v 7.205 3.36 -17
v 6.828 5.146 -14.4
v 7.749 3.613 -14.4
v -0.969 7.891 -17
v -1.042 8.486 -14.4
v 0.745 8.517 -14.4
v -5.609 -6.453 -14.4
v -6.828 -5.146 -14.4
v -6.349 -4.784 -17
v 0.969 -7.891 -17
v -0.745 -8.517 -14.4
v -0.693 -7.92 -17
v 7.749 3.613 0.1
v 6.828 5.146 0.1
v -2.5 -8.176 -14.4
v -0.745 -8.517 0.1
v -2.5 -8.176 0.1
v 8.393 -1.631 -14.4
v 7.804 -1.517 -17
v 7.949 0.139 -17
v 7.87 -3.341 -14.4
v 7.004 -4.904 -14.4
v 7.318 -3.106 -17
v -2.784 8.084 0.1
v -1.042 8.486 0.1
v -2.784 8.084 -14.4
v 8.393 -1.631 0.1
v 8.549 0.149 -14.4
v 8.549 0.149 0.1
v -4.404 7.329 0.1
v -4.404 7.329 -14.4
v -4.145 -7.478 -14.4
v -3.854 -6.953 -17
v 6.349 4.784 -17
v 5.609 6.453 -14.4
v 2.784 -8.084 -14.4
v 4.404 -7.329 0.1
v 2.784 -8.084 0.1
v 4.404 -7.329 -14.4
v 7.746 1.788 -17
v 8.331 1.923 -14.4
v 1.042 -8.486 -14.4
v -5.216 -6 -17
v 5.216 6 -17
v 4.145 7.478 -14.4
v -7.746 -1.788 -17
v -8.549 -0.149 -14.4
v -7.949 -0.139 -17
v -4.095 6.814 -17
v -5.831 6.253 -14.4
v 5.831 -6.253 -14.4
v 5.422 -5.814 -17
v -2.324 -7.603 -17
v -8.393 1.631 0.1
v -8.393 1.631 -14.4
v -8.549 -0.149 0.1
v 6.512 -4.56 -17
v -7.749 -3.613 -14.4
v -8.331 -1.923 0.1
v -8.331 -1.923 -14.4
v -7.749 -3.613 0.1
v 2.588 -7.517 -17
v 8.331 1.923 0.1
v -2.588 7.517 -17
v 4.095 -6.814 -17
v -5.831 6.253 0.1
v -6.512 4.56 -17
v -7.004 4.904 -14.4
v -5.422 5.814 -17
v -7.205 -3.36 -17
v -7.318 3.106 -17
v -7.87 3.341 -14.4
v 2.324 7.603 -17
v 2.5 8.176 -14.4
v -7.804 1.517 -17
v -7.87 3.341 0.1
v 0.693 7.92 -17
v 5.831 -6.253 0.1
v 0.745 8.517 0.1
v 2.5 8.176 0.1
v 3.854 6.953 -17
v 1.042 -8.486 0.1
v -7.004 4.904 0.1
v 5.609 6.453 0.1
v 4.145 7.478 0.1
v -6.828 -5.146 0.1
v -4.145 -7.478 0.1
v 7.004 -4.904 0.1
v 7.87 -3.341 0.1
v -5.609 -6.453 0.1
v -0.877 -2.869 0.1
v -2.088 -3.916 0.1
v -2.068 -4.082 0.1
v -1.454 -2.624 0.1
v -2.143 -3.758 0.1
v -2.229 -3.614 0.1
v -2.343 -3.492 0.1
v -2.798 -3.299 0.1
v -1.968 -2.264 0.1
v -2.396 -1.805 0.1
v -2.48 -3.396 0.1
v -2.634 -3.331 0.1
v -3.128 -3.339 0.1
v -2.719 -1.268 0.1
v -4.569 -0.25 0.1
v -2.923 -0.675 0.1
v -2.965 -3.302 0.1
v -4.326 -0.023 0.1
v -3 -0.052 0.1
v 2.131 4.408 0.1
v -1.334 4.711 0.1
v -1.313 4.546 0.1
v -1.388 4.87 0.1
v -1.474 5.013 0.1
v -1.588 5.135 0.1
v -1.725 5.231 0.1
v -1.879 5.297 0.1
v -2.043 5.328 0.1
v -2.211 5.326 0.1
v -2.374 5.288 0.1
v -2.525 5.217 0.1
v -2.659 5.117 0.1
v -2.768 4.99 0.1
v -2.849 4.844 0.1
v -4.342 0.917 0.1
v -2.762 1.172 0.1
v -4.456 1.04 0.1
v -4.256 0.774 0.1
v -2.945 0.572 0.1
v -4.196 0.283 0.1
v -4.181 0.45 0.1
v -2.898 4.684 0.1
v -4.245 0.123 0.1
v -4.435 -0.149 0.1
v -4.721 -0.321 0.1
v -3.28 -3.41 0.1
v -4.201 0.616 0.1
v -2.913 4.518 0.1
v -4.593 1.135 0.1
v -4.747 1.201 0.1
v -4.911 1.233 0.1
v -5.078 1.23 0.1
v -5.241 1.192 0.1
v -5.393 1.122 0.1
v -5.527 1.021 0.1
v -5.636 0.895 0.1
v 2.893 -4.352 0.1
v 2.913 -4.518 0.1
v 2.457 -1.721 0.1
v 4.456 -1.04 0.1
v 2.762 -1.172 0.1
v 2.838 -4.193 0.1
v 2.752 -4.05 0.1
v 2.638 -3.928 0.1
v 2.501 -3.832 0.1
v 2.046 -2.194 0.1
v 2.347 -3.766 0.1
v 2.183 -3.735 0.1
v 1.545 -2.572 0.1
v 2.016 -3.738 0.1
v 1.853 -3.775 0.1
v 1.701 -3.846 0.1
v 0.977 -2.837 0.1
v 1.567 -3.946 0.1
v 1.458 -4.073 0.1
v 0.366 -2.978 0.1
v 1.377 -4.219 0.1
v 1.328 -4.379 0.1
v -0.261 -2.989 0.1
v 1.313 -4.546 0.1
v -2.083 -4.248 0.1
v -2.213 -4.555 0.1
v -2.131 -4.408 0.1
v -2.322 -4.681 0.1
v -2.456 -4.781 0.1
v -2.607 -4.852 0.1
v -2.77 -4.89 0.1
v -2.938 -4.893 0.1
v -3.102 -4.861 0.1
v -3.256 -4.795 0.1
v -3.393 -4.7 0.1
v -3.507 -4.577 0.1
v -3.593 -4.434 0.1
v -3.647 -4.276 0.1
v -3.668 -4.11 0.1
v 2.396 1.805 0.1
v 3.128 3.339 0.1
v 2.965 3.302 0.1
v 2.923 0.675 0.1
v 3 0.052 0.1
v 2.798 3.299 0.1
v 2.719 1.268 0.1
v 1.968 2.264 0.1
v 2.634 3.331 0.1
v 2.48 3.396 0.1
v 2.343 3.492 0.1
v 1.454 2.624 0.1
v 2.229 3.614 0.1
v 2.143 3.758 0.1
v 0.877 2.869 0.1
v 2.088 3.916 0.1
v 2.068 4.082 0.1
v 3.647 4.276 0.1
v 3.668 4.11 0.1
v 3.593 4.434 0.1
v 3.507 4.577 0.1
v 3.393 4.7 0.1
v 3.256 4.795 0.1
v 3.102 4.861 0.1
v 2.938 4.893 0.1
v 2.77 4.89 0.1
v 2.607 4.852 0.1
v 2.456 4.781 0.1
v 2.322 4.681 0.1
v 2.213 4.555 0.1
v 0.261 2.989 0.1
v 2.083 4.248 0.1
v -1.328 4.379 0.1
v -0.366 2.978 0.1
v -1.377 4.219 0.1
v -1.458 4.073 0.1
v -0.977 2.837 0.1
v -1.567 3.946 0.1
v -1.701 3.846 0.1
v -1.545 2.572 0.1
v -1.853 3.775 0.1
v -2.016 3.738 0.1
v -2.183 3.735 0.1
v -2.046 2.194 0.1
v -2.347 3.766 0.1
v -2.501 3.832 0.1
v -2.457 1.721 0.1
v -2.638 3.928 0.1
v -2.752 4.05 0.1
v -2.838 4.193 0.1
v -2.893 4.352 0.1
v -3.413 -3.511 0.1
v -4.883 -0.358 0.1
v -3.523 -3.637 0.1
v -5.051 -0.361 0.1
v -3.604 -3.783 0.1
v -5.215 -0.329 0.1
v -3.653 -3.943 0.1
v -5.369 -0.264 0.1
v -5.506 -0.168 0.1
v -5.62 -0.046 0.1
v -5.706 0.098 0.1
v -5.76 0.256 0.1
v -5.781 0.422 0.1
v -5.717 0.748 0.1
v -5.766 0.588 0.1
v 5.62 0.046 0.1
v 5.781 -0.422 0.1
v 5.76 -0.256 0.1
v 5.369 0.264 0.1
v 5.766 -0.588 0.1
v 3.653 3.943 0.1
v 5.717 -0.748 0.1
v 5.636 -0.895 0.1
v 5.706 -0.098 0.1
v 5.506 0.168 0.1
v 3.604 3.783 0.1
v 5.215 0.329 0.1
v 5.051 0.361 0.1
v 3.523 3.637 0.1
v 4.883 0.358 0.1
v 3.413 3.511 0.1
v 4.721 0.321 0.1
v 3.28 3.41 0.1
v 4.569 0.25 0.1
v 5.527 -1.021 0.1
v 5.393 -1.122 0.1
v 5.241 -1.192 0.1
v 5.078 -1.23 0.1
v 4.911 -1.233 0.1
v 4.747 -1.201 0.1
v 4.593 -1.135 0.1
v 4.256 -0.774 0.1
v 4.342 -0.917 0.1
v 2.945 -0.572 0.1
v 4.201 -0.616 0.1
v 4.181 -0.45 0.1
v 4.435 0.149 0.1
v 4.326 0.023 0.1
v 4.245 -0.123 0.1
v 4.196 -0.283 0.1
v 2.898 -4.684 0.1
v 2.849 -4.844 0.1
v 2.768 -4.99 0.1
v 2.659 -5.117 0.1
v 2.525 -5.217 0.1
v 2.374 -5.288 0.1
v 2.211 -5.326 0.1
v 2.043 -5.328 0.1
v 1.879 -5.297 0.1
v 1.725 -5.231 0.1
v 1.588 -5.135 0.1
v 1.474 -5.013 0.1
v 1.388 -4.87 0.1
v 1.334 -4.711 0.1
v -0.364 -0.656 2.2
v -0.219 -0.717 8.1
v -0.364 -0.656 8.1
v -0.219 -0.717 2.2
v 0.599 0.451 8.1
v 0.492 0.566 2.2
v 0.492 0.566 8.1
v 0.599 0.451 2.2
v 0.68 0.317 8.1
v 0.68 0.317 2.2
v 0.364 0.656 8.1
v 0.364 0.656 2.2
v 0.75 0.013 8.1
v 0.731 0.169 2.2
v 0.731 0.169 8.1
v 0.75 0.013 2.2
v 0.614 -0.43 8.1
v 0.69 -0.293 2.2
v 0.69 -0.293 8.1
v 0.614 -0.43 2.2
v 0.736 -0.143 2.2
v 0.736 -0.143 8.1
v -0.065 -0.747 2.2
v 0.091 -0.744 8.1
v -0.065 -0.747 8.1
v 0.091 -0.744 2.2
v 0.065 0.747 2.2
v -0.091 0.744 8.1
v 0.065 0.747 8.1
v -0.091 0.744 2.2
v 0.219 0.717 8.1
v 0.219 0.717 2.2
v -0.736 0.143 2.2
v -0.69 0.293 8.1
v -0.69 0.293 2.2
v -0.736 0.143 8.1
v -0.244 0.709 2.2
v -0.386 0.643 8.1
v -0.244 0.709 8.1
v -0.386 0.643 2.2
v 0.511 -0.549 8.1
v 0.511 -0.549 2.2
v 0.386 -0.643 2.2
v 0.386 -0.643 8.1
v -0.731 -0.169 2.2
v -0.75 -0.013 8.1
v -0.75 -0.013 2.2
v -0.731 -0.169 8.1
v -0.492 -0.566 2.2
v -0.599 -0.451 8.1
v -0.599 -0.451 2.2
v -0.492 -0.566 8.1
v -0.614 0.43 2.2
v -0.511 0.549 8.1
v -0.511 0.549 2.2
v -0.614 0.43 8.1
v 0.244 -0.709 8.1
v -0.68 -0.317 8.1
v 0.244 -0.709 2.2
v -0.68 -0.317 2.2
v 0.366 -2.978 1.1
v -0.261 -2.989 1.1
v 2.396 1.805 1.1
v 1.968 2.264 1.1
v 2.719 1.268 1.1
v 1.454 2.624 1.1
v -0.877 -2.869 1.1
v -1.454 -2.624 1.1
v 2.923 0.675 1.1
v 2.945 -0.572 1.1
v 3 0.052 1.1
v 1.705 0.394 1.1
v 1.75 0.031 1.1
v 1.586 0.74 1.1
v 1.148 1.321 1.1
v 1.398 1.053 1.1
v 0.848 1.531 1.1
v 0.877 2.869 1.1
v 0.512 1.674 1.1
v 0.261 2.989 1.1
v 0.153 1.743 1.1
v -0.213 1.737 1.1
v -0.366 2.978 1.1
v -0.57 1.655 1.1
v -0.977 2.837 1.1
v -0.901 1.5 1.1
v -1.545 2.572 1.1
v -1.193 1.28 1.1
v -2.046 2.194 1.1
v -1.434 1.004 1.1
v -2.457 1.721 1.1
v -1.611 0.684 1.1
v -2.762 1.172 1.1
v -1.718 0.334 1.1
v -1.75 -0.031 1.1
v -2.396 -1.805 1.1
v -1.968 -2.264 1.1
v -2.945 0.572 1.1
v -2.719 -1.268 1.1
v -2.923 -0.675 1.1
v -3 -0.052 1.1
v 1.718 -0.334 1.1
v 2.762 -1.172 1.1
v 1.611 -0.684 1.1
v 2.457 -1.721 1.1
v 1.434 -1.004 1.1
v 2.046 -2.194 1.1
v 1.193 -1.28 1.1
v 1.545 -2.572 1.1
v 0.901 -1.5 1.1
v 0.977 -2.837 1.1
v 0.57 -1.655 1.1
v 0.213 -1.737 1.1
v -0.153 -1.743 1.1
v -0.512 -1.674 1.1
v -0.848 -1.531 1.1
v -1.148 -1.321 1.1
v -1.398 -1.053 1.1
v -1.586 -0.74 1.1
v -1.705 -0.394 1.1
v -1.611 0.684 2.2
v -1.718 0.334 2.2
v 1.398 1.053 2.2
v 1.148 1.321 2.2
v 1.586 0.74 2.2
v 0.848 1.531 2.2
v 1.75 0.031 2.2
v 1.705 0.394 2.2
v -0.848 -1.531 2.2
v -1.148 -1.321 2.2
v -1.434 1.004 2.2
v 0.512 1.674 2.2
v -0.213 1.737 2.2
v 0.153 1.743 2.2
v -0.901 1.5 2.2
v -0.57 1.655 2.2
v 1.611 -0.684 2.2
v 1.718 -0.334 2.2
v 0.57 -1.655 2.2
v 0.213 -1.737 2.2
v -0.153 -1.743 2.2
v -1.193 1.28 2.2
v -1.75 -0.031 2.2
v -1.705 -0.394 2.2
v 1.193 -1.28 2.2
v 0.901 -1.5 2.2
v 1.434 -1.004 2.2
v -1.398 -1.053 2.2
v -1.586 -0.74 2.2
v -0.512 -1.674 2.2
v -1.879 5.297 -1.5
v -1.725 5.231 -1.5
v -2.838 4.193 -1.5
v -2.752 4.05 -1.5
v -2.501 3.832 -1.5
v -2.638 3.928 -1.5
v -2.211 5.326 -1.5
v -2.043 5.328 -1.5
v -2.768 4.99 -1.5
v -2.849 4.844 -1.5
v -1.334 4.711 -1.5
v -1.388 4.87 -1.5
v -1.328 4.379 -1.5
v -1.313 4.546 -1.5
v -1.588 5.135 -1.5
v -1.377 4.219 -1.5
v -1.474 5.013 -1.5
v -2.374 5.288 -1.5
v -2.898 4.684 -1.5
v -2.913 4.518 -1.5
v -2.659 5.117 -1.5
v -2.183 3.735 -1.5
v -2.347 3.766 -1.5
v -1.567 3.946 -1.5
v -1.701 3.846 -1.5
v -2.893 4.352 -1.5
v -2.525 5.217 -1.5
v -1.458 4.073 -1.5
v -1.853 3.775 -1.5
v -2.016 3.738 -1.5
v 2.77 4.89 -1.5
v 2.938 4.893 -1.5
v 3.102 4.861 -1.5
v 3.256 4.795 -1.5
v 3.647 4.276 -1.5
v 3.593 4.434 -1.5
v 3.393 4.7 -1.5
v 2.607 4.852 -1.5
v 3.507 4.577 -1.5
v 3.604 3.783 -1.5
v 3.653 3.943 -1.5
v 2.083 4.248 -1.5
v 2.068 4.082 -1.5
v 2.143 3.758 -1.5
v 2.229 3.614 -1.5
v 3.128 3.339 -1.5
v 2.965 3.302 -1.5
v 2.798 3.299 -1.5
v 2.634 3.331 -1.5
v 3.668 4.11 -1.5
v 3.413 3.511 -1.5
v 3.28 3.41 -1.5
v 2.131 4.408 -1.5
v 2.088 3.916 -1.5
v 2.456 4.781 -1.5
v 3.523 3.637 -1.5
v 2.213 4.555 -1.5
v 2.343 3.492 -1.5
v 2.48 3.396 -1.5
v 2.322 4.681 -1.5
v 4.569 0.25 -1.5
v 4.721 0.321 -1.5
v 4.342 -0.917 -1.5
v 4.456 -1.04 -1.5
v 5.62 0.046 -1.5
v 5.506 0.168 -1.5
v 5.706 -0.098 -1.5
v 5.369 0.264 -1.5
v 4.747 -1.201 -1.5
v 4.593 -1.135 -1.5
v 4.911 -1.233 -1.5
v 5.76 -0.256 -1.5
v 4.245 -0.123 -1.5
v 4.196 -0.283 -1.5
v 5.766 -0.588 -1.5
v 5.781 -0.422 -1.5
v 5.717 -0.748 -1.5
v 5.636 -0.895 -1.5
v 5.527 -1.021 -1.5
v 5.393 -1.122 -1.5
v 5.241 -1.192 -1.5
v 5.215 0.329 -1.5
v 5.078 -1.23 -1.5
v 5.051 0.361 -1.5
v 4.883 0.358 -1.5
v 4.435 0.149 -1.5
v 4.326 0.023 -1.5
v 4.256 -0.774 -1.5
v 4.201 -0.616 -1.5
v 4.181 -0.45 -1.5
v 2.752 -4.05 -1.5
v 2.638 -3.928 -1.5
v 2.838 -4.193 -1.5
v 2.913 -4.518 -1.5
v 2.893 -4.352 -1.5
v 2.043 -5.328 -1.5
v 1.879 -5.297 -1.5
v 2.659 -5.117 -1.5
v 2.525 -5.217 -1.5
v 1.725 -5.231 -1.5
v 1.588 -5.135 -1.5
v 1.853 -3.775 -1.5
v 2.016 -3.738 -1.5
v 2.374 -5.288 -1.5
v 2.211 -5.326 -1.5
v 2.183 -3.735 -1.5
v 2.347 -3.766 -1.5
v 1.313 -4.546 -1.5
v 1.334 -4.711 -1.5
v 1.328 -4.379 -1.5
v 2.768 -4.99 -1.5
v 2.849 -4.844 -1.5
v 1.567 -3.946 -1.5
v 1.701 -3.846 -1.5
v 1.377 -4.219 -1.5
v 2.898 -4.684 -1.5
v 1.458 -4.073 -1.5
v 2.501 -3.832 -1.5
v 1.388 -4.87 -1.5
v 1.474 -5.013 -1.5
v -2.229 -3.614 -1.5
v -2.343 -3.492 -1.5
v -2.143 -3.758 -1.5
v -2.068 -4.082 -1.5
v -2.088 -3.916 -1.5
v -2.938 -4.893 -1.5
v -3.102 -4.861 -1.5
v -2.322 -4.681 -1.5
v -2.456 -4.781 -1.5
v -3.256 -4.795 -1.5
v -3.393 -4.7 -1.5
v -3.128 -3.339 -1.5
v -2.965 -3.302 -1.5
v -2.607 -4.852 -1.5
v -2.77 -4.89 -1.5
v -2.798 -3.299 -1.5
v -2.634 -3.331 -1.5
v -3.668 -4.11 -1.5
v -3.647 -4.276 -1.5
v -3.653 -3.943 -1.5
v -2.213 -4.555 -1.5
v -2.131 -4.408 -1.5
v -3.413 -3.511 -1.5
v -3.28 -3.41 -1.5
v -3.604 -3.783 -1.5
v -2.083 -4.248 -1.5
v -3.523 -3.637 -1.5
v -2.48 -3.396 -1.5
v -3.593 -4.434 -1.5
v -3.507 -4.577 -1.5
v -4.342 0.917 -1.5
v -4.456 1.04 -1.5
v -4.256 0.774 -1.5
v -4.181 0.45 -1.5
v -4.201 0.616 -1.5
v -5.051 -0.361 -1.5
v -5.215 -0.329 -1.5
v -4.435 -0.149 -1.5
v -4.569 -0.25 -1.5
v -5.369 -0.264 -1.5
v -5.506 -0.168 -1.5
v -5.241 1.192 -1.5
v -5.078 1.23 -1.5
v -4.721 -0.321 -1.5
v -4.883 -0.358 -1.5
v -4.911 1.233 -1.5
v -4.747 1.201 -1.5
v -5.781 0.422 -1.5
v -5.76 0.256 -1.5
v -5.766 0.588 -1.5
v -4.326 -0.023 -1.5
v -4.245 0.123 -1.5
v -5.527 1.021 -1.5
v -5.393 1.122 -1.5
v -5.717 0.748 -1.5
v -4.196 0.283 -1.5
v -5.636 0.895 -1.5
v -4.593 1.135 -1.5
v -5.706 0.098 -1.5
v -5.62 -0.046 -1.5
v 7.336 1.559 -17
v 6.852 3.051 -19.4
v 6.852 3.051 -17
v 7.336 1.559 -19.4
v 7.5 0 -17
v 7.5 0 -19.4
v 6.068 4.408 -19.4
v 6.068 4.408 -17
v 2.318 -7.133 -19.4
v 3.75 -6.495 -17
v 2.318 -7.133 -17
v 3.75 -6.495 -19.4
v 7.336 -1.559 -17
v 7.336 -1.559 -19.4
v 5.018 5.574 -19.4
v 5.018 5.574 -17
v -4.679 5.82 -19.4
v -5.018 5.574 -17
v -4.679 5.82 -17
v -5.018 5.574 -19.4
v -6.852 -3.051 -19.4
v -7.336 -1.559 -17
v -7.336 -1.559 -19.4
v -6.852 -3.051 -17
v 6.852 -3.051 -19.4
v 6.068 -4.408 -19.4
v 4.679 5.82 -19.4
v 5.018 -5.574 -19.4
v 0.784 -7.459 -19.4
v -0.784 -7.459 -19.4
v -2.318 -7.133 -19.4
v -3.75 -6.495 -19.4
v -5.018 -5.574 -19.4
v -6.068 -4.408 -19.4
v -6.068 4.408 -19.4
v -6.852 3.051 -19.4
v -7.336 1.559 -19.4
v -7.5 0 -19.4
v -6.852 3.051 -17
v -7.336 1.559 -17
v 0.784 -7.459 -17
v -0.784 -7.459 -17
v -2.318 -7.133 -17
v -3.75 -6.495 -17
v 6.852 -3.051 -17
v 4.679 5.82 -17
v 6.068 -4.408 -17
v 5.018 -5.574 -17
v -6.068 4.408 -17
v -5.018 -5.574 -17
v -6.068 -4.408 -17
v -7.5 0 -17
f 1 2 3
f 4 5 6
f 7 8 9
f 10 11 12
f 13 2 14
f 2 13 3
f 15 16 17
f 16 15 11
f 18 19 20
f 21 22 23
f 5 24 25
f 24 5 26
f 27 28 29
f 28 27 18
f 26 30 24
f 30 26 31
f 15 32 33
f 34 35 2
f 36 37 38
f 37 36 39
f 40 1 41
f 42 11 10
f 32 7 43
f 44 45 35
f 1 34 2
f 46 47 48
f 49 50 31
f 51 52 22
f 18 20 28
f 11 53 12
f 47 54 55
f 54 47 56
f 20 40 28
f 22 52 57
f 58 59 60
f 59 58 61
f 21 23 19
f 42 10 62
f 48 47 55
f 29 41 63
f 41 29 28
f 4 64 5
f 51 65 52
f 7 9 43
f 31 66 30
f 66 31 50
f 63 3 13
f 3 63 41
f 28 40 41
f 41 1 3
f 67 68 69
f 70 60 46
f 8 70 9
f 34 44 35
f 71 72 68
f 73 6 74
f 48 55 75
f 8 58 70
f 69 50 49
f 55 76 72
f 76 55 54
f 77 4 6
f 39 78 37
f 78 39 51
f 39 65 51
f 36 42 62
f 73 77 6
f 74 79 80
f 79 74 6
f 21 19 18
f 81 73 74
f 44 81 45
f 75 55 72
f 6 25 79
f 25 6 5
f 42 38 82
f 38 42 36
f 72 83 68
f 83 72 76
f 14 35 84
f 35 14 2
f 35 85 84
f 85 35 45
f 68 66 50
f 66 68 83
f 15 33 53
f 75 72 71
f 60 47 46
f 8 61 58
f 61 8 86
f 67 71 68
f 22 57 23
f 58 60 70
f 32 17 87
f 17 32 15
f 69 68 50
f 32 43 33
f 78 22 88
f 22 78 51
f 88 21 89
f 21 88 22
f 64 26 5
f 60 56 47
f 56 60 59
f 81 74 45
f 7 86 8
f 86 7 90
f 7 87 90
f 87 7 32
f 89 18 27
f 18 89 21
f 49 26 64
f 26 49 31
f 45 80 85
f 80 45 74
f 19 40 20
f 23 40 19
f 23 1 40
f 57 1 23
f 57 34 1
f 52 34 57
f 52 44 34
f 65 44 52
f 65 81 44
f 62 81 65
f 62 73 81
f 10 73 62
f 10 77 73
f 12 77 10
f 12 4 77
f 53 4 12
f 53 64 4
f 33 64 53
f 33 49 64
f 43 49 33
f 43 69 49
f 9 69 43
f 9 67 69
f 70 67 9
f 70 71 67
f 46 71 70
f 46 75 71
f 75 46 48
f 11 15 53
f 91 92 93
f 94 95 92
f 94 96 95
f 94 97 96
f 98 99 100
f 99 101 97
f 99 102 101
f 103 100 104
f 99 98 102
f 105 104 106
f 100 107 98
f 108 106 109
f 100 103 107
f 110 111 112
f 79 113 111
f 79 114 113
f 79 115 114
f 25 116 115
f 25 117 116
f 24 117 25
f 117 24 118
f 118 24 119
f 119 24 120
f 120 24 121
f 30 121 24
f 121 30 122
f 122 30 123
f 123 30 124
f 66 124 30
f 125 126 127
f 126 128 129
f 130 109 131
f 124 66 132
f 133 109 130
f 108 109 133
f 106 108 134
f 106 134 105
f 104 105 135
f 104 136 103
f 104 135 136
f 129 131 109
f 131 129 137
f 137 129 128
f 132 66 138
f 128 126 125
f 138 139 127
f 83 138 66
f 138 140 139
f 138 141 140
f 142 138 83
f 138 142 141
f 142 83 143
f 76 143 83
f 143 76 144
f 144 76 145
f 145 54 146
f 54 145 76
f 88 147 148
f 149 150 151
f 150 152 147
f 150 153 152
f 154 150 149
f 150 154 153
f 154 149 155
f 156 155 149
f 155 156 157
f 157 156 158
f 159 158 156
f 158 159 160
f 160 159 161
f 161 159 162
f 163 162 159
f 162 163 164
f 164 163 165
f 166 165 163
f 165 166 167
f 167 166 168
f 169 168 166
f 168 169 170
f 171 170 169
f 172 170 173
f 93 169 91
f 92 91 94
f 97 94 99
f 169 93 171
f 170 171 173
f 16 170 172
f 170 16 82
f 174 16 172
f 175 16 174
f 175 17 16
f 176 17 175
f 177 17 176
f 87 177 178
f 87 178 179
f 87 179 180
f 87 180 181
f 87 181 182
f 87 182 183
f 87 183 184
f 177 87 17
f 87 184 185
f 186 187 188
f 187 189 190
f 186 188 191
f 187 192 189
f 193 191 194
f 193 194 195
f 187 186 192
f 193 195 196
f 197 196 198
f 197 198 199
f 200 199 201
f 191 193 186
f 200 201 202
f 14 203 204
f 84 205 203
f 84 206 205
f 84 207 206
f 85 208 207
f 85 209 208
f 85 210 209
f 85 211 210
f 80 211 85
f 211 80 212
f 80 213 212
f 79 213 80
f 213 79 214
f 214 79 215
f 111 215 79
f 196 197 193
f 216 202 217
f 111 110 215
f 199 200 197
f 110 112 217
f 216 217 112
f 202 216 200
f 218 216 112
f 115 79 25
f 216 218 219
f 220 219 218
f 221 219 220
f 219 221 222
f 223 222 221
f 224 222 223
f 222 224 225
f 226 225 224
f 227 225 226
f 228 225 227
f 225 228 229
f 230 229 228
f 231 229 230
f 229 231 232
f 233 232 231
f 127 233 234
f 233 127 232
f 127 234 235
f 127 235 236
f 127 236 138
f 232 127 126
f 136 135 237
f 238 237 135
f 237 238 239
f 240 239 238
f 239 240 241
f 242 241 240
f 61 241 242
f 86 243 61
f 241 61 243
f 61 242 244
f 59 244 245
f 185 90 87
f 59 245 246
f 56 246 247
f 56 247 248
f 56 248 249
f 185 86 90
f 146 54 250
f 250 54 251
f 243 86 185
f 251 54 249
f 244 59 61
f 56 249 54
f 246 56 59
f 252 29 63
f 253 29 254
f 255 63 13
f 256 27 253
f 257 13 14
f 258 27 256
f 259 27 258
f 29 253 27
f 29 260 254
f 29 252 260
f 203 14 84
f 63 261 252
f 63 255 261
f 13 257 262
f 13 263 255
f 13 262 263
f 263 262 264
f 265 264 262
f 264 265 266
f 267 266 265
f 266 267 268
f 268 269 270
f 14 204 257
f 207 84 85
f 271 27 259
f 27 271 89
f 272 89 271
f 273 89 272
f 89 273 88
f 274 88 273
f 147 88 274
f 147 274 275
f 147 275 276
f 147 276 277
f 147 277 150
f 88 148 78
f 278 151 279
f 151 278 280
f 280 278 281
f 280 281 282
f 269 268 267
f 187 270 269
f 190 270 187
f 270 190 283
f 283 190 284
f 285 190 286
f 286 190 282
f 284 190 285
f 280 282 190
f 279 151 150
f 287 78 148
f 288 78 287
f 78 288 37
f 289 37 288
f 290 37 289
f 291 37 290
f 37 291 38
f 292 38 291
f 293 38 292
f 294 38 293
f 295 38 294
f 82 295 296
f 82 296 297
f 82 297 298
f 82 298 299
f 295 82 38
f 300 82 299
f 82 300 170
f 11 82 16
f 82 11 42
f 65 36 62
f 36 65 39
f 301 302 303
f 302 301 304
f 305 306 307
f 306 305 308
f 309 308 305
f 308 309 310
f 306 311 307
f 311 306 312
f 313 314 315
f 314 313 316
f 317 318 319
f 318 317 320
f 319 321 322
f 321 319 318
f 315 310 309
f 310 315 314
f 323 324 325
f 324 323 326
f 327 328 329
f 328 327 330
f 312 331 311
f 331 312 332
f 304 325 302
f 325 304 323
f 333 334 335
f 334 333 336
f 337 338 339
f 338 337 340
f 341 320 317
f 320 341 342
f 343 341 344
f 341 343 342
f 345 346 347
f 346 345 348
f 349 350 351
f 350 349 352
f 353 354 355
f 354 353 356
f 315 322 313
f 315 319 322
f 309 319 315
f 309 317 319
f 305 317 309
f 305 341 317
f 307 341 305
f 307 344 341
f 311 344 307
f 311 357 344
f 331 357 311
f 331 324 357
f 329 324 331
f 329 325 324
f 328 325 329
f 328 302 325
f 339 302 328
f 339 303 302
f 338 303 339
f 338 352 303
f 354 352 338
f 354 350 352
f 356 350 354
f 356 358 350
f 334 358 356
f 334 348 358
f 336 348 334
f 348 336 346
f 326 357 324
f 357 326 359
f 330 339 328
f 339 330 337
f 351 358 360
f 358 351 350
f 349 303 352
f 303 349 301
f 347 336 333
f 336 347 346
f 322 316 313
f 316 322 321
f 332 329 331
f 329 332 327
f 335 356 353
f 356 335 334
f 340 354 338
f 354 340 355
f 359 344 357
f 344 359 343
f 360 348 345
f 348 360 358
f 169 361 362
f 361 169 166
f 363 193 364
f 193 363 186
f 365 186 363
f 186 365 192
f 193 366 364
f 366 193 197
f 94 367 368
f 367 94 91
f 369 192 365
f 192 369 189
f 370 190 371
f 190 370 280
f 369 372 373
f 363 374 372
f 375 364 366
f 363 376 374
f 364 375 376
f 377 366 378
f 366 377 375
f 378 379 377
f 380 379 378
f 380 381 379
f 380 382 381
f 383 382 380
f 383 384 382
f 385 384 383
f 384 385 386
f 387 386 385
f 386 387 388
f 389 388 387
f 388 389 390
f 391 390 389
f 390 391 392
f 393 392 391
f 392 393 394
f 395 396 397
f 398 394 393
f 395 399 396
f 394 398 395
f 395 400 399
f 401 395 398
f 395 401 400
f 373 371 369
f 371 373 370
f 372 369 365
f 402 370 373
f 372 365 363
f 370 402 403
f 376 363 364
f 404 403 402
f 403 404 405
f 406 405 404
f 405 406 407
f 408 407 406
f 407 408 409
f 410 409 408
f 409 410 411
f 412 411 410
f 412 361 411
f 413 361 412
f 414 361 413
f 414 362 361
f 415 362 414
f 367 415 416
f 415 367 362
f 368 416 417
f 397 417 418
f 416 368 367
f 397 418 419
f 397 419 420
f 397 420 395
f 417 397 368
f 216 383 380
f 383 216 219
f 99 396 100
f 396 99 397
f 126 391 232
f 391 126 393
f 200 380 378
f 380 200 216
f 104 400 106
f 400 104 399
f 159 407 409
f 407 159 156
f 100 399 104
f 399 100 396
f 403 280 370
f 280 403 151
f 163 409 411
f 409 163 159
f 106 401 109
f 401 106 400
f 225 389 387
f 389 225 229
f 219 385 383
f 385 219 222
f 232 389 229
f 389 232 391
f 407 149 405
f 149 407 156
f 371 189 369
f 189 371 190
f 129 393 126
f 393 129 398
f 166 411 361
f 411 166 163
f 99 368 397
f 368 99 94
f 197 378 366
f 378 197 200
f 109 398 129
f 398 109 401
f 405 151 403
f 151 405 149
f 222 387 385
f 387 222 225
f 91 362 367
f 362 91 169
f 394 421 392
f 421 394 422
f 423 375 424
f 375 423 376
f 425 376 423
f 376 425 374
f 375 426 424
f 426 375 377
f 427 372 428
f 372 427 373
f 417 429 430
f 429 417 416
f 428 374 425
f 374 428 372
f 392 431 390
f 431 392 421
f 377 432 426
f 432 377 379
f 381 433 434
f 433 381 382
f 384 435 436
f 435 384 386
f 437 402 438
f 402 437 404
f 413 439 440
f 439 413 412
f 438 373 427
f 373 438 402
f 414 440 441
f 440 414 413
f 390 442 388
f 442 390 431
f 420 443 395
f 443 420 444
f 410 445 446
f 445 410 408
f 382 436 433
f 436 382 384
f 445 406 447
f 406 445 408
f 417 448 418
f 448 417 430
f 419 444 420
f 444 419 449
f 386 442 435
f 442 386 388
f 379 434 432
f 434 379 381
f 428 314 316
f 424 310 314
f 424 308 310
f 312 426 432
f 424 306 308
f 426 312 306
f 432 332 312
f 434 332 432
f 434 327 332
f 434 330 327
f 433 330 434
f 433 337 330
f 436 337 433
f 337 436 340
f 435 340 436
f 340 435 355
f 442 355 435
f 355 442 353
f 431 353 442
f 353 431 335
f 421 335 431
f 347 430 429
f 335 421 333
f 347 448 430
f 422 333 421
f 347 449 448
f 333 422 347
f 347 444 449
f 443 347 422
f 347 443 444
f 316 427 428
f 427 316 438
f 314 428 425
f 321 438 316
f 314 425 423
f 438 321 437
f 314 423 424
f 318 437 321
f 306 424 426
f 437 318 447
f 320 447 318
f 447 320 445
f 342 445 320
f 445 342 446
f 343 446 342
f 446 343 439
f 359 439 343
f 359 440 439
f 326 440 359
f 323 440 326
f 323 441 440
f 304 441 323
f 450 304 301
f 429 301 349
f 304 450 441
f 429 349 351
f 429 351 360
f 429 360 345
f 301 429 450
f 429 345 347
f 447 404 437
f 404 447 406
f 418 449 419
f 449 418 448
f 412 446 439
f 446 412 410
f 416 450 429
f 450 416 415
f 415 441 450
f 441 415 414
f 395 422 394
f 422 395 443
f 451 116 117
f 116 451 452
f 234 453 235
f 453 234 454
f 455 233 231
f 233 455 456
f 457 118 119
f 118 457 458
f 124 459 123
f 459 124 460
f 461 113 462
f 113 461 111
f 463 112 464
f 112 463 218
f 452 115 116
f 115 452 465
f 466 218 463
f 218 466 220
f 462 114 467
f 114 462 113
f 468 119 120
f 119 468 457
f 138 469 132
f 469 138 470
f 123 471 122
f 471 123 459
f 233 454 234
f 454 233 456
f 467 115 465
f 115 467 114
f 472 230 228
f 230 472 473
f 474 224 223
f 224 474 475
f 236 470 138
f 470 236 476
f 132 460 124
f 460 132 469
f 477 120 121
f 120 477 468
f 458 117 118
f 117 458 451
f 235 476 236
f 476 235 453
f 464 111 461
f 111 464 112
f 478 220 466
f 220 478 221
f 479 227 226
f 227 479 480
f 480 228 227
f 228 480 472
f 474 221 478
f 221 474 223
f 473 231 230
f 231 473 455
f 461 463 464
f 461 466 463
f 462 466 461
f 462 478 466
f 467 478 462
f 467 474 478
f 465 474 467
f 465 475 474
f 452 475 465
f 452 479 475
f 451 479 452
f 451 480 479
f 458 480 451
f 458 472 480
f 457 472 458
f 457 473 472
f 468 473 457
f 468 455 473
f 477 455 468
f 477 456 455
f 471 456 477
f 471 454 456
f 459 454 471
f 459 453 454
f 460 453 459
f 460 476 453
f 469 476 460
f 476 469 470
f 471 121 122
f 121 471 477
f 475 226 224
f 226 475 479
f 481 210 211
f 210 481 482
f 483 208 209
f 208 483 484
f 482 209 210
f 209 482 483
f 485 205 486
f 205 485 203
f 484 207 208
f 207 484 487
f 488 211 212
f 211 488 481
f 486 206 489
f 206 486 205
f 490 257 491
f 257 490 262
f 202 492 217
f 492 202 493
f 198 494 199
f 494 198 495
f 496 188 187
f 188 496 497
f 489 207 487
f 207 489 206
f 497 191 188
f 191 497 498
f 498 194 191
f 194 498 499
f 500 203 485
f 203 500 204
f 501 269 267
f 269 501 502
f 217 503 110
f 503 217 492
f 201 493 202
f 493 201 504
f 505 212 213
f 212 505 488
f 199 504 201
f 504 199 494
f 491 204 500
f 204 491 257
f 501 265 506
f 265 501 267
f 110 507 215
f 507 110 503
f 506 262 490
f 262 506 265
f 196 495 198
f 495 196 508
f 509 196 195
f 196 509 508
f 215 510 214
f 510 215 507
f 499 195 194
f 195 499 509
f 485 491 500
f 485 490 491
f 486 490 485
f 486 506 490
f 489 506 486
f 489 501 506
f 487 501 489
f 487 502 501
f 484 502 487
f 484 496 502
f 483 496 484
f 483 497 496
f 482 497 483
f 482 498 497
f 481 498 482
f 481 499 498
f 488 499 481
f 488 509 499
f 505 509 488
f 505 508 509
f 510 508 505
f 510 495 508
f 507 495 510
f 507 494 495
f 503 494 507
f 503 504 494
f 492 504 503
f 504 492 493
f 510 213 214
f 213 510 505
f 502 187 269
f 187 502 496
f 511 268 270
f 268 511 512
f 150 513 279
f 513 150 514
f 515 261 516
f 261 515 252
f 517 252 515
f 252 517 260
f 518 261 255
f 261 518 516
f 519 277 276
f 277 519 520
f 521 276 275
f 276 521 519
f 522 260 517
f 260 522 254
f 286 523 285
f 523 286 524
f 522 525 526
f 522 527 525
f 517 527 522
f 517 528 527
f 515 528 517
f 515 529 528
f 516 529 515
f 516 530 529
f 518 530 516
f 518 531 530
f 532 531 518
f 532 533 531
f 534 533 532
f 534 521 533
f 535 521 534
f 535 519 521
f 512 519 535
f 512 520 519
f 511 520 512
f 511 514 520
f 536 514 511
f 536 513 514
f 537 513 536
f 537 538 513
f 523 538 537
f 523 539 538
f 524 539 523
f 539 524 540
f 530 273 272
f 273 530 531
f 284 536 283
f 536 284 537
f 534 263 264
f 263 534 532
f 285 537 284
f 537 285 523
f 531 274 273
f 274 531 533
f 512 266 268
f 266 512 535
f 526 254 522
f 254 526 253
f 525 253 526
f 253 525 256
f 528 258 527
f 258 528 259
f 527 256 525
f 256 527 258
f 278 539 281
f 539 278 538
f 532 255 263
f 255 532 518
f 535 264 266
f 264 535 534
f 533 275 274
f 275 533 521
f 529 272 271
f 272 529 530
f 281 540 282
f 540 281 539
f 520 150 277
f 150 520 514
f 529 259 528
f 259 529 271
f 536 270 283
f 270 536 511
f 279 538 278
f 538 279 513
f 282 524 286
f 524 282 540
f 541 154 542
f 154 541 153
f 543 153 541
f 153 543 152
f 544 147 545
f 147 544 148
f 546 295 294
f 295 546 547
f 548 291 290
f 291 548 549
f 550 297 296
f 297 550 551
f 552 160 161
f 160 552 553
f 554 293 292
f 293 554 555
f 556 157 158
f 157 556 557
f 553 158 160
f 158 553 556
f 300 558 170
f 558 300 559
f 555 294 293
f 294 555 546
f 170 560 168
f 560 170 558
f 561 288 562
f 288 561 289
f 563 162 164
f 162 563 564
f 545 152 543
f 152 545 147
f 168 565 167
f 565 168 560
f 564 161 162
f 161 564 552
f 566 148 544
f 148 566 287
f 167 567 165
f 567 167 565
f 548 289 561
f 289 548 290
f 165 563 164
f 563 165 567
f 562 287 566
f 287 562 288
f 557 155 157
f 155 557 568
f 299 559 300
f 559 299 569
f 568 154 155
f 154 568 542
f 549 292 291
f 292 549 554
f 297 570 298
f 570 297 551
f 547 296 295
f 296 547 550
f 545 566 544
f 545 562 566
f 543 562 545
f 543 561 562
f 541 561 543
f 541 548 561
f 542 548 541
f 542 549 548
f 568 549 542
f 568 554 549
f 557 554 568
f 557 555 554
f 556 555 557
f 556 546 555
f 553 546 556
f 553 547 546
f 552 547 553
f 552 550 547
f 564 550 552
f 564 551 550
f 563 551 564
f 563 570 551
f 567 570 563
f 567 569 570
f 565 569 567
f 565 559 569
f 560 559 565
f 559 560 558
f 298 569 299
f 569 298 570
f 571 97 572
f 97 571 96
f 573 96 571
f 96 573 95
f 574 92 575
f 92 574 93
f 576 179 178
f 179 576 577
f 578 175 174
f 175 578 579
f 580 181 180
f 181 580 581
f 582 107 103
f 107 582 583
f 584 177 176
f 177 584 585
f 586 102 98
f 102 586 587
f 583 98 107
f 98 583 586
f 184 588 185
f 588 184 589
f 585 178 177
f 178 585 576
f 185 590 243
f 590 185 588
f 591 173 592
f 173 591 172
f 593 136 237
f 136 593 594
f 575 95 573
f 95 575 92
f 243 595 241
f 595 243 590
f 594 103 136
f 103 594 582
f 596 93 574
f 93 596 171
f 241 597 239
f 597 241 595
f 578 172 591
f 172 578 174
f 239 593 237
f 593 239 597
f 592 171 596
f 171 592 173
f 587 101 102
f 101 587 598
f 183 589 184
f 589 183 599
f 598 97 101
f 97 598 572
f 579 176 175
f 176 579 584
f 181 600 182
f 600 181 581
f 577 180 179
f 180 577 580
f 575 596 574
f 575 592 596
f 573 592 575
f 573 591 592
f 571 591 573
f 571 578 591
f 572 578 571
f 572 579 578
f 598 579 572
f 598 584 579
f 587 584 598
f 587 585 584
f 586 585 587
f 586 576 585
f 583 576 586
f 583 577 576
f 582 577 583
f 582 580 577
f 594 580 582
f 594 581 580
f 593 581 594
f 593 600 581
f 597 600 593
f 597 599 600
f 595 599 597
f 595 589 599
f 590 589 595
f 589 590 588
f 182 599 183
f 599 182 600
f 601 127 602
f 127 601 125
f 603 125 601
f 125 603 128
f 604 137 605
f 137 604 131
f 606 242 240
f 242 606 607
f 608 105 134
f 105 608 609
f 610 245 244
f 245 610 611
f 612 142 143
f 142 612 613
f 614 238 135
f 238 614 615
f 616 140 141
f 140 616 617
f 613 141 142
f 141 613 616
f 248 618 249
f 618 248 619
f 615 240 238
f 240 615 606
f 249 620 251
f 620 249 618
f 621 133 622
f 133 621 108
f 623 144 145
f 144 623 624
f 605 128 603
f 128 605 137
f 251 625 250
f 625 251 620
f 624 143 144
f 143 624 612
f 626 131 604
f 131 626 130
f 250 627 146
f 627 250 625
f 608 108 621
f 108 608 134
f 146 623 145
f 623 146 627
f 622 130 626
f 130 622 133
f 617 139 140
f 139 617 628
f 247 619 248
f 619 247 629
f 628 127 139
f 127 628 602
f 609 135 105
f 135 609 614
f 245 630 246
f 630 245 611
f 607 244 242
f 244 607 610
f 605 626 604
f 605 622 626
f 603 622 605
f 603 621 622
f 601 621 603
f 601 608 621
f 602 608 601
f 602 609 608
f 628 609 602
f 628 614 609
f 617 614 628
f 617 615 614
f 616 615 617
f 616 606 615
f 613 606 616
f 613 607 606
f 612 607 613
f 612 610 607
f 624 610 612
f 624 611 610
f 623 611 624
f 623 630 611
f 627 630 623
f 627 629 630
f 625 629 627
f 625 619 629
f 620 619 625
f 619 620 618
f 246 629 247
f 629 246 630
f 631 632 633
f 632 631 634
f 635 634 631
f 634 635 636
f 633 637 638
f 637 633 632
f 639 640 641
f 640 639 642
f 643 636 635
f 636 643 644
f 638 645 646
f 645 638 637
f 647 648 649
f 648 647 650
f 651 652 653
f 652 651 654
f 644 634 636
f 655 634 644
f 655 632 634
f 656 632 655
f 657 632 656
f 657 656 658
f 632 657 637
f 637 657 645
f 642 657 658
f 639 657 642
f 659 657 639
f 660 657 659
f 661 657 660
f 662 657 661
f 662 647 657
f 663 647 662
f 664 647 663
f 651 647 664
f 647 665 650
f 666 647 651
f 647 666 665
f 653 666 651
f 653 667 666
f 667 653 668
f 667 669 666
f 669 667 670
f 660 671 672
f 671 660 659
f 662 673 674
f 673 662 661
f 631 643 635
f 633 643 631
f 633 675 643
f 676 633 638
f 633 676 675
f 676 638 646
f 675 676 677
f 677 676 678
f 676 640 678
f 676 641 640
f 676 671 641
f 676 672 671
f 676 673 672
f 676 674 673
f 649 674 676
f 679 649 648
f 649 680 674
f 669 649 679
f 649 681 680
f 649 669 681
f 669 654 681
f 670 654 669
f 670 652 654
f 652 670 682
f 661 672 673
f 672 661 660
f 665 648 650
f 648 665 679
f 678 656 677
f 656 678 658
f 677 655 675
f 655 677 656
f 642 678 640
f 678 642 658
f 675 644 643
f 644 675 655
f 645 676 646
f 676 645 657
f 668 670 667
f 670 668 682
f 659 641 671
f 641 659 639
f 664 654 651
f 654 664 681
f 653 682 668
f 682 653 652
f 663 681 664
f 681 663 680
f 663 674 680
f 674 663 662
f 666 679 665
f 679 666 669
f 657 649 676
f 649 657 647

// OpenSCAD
//motor 1717 modeling
//encoder
//https://www.shinkoh-faulhaber.jp/JP_data_edition_2020/JP_IEH2-4096_DFF.pdf
//https://www.shinkoh-faulhaber.jp/products/series/1717sr
//Author Y.Nakagawa
//Date: 2024/12/07
//revised: 2025/1/10

motor1717(25);
//motor1717(5);
//connector1717();
//encoder1717();
//motor1717_screwhole();


module motor1717(rotate){
  translate([0,0,-17])rotate([0,0,rotate])motor1717_body();
  translate([0,0,-17-2.4]) encoder1717();
}

module motor1717_body(){
  $fs = 0.01;
  mr1 = 17.1/2; //mm motor radius //モーター半径
  mr2 = 15.9/2; //mm motor 肩のスボミの径
  mh1 =14.5; //mm motor length //モーターのスボミまでの長さ
  mh2 =17.1-mh1; //mm motor length //モーターのスボミの長さ
  axr =1.5/2; //mm motor axis radius //モーター軸の半径
  axl = 8; //mm motor axis length //モーター軸の長さ
  axl2 = 6; //mm 使わないが、軸が出てる長さは6㎜
  cr1 = 6/2; //mm motor center sholder big radius
  cr2 = 3.5/2; //mm motor center sholder small radius
  ch1 = 1; //mm from motor 
  ch2 = 2.1; //mm from motor

  difference(){
  union(){
    color("black")
      hull(){
        translate([0,0, mh2]) cylinder(h=mh1, r=mr1);
        translate([0,0,0]) cylinder(h=mh1, r=mr2);
      }
      color("whitesmoke")translate([0,0,mh1+mh2])cylinder(h=axl, r=axr);
      translate([0,0,mh1+mh2])cylinder(h=ch1, r=cr1);
      translate([0,0,mh1+mh2])cylinder(h=ch2, r=cr2);
  }
    translate([0,0,mh1+mh2-1.6]) motor1717_screwhole();
  }
}

module motor1717_screwhole(){
  //M1.6x1.6mm
  $fs=0.01;
  rcircle = 5; //同心円の半径
  height = 0; //中心からの距離
  sh = 1.6; // ネジの長さ
  sr = 0.8; // ネジ穴の半径 M1.6

  for(angle=[0:60:360]){
      translate([rcircle*sin(angle),rcircle*cos(angle),height]) cylinder(h=1.6+1, r=0.8);
  }
}

module encoder1717(){
  $fs=0.01;
  eh = 2.4; //mm encoder height
  er = 15/2; //mm encoder radius
  el = 15-13.32; //mm encoder luck
  ed = 15;

  color("black")
  difference(){
    cylinder(h=eh, r=er);
    translate([-er,er-el,-1])cube([ed+2, ed+2, eh+2]);
  }
    
}
